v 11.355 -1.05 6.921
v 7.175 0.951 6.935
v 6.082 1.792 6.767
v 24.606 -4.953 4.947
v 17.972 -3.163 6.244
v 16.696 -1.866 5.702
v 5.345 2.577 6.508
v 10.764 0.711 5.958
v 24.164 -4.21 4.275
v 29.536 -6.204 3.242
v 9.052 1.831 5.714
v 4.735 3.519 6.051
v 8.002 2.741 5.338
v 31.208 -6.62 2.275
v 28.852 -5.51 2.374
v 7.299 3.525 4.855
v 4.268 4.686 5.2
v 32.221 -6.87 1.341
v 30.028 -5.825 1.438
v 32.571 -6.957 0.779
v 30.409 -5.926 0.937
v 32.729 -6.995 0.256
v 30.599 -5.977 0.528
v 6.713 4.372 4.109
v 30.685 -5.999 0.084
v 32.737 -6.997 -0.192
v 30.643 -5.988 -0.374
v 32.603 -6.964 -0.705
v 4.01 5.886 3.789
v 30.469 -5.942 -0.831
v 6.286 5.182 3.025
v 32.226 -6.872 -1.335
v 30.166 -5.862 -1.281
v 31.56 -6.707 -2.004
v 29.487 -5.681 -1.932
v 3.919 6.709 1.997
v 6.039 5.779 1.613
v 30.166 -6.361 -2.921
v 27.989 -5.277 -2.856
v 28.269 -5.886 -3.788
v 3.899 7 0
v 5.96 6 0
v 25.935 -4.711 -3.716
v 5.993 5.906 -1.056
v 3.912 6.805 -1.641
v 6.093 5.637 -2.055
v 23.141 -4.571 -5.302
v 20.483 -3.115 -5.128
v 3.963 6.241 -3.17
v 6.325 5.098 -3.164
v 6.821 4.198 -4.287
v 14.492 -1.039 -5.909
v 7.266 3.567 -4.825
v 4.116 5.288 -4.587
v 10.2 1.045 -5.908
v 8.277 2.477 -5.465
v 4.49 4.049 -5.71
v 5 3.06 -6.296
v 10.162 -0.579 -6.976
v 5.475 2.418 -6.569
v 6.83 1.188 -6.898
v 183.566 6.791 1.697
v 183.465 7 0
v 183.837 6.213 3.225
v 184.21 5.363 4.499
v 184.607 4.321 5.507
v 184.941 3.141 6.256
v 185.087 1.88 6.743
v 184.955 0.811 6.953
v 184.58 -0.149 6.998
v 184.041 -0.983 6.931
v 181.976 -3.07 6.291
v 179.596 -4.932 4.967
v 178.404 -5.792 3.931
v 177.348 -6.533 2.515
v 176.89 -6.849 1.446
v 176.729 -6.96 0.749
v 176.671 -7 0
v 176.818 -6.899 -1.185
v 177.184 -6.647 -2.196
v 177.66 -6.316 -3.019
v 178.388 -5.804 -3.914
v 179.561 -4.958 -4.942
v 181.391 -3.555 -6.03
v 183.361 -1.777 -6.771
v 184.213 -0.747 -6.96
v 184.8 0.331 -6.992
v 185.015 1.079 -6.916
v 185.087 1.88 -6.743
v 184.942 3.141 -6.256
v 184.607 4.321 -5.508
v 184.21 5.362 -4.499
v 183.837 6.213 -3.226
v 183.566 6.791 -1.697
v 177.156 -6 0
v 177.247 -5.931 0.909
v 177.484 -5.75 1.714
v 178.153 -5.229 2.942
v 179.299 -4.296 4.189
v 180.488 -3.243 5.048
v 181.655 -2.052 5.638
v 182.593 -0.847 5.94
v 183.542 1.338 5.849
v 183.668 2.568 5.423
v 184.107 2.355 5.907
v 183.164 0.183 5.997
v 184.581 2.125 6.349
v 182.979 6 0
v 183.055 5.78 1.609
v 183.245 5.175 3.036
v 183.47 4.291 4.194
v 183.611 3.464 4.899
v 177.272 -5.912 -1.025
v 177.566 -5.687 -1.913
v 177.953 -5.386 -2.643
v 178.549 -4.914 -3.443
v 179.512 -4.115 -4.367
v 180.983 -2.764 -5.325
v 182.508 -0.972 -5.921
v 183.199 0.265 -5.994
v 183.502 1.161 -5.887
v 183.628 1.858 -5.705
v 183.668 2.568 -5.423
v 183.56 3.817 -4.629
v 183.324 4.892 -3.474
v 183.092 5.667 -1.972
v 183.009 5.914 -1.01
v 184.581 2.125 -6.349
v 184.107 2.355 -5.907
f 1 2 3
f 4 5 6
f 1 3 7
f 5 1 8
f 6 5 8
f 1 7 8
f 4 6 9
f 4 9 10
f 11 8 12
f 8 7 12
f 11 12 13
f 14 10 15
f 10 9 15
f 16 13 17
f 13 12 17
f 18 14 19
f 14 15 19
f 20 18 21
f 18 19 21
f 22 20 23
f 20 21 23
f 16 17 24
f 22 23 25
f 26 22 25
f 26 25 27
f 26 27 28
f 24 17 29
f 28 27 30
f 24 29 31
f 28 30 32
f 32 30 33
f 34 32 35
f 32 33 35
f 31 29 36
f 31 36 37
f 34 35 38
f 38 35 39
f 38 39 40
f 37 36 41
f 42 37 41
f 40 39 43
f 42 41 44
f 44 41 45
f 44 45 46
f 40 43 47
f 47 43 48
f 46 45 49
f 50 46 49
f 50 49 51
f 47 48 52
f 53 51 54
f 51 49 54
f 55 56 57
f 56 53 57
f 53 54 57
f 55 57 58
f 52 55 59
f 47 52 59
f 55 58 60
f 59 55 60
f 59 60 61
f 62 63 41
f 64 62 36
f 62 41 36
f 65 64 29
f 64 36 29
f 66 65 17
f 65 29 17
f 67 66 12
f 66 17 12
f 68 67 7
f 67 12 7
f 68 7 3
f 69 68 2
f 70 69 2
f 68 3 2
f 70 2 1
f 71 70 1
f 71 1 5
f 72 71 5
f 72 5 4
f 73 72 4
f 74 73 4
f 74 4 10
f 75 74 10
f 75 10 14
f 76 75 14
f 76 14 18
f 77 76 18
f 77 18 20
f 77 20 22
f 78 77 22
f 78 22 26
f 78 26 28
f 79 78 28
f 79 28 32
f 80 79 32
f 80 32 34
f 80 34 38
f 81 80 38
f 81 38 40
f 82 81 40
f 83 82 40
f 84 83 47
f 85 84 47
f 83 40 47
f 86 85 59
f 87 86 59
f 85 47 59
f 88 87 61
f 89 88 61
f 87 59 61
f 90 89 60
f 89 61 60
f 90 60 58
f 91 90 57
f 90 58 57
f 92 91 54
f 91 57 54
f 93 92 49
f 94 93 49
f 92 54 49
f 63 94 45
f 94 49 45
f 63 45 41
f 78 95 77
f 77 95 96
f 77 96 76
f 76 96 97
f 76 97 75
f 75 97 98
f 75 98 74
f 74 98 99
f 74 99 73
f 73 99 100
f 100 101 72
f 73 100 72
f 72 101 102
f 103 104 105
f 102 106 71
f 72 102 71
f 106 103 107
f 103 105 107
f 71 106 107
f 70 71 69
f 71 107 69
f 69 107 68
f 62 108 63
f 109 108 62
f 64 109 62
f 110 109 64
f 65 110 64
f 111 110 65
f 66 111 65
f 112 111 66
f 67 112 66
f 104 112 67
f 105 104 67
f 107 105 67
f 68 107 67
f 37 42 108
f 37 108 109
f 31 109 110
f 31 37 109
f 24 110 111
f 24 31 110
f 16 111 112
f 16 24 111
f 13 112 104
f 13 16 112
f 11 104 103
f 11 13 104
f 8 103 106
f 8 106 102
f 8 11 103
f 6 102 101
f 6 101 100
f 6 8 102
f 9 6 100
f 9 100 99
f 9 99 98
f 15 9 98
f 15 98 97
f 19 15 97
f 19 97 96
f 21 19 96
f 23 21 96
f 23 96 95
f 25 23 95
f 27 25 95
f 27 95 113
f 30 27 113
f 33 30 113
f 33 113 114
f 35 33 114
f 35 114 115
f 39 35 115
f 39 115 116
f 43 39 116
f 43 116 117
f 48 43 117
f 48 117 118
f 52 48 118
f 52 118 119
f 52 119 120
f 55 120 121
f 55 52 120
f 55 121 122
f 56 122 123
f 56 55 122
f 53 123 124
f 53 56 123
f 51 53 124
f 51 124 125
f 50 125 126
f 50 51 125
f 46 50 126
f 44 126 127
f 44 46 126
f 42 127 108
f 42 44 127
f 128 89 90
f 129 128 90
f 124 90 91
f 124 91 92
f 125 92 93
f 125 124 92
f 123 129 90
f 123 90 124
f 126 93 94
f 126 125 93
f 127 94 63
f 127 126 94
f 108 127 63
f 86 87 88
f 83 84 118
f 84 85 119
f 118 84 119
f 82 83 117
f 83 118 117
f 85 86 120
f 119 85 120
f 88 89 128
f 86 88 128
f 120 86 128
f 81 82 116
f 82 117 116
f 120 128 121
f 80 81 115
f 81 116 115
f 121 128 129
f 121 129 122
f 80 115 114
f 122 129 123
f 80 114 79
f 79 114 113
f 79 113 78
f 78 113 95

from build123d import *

# Parameters (mm, degrees)
F0_R     = 7
F0_R_2   = 6
F1_DEPTH = 188.96
F4_R     = 8
F5_DEPTH = 35
F9_DEPTH = 15


with BuildPart() as f1:
    # F0 (on Right) → F1 (new body)
    with BuildSketch(Plane.YZ):
        Circle(F0_R)
        Circle(F0_R_2, mode=Mode.SUBTRACT)
    extrude(amount=F1_DEPTH)

    # F4 (on face) → F5 (cut, symmetric)
    with BuildSketch(Plane(origin=(0, 0, 0), x_dir=(-0.4365976739, -0.899656863, 0), z_dir=(-0.899656863, 0.4365976739, 0))):
        Circle(F4_R)
    extrude(amount=F5_DEPTH, both=True, mode=Mode.SUBTRACT)

    # F8 (on line) → F9 (cut, symmetric)
    with BuildSketch(Plane(origin=(36.0190882591, 74.2212381898, 0), x_dir=(-0.899656863, 0.4365976739, 0), z_dir=(0.4365976739, 0.899656863, 0))):
        with BuildLine():
            ThreePointArc((-175.5327409971, 5.777498639), (-173.1401287256, -7.3576029162), (-161.999160829, 0))
            ThreePointArc((-161.999160829, 0), (-166.8581929324, 7.3576029162), (-175.5327409971, 5.777498639))
        make_face()
    extrude(amount=F9_DEPTH, both=True, mode=Mode.SUBTRACT)


solid = f1.part
